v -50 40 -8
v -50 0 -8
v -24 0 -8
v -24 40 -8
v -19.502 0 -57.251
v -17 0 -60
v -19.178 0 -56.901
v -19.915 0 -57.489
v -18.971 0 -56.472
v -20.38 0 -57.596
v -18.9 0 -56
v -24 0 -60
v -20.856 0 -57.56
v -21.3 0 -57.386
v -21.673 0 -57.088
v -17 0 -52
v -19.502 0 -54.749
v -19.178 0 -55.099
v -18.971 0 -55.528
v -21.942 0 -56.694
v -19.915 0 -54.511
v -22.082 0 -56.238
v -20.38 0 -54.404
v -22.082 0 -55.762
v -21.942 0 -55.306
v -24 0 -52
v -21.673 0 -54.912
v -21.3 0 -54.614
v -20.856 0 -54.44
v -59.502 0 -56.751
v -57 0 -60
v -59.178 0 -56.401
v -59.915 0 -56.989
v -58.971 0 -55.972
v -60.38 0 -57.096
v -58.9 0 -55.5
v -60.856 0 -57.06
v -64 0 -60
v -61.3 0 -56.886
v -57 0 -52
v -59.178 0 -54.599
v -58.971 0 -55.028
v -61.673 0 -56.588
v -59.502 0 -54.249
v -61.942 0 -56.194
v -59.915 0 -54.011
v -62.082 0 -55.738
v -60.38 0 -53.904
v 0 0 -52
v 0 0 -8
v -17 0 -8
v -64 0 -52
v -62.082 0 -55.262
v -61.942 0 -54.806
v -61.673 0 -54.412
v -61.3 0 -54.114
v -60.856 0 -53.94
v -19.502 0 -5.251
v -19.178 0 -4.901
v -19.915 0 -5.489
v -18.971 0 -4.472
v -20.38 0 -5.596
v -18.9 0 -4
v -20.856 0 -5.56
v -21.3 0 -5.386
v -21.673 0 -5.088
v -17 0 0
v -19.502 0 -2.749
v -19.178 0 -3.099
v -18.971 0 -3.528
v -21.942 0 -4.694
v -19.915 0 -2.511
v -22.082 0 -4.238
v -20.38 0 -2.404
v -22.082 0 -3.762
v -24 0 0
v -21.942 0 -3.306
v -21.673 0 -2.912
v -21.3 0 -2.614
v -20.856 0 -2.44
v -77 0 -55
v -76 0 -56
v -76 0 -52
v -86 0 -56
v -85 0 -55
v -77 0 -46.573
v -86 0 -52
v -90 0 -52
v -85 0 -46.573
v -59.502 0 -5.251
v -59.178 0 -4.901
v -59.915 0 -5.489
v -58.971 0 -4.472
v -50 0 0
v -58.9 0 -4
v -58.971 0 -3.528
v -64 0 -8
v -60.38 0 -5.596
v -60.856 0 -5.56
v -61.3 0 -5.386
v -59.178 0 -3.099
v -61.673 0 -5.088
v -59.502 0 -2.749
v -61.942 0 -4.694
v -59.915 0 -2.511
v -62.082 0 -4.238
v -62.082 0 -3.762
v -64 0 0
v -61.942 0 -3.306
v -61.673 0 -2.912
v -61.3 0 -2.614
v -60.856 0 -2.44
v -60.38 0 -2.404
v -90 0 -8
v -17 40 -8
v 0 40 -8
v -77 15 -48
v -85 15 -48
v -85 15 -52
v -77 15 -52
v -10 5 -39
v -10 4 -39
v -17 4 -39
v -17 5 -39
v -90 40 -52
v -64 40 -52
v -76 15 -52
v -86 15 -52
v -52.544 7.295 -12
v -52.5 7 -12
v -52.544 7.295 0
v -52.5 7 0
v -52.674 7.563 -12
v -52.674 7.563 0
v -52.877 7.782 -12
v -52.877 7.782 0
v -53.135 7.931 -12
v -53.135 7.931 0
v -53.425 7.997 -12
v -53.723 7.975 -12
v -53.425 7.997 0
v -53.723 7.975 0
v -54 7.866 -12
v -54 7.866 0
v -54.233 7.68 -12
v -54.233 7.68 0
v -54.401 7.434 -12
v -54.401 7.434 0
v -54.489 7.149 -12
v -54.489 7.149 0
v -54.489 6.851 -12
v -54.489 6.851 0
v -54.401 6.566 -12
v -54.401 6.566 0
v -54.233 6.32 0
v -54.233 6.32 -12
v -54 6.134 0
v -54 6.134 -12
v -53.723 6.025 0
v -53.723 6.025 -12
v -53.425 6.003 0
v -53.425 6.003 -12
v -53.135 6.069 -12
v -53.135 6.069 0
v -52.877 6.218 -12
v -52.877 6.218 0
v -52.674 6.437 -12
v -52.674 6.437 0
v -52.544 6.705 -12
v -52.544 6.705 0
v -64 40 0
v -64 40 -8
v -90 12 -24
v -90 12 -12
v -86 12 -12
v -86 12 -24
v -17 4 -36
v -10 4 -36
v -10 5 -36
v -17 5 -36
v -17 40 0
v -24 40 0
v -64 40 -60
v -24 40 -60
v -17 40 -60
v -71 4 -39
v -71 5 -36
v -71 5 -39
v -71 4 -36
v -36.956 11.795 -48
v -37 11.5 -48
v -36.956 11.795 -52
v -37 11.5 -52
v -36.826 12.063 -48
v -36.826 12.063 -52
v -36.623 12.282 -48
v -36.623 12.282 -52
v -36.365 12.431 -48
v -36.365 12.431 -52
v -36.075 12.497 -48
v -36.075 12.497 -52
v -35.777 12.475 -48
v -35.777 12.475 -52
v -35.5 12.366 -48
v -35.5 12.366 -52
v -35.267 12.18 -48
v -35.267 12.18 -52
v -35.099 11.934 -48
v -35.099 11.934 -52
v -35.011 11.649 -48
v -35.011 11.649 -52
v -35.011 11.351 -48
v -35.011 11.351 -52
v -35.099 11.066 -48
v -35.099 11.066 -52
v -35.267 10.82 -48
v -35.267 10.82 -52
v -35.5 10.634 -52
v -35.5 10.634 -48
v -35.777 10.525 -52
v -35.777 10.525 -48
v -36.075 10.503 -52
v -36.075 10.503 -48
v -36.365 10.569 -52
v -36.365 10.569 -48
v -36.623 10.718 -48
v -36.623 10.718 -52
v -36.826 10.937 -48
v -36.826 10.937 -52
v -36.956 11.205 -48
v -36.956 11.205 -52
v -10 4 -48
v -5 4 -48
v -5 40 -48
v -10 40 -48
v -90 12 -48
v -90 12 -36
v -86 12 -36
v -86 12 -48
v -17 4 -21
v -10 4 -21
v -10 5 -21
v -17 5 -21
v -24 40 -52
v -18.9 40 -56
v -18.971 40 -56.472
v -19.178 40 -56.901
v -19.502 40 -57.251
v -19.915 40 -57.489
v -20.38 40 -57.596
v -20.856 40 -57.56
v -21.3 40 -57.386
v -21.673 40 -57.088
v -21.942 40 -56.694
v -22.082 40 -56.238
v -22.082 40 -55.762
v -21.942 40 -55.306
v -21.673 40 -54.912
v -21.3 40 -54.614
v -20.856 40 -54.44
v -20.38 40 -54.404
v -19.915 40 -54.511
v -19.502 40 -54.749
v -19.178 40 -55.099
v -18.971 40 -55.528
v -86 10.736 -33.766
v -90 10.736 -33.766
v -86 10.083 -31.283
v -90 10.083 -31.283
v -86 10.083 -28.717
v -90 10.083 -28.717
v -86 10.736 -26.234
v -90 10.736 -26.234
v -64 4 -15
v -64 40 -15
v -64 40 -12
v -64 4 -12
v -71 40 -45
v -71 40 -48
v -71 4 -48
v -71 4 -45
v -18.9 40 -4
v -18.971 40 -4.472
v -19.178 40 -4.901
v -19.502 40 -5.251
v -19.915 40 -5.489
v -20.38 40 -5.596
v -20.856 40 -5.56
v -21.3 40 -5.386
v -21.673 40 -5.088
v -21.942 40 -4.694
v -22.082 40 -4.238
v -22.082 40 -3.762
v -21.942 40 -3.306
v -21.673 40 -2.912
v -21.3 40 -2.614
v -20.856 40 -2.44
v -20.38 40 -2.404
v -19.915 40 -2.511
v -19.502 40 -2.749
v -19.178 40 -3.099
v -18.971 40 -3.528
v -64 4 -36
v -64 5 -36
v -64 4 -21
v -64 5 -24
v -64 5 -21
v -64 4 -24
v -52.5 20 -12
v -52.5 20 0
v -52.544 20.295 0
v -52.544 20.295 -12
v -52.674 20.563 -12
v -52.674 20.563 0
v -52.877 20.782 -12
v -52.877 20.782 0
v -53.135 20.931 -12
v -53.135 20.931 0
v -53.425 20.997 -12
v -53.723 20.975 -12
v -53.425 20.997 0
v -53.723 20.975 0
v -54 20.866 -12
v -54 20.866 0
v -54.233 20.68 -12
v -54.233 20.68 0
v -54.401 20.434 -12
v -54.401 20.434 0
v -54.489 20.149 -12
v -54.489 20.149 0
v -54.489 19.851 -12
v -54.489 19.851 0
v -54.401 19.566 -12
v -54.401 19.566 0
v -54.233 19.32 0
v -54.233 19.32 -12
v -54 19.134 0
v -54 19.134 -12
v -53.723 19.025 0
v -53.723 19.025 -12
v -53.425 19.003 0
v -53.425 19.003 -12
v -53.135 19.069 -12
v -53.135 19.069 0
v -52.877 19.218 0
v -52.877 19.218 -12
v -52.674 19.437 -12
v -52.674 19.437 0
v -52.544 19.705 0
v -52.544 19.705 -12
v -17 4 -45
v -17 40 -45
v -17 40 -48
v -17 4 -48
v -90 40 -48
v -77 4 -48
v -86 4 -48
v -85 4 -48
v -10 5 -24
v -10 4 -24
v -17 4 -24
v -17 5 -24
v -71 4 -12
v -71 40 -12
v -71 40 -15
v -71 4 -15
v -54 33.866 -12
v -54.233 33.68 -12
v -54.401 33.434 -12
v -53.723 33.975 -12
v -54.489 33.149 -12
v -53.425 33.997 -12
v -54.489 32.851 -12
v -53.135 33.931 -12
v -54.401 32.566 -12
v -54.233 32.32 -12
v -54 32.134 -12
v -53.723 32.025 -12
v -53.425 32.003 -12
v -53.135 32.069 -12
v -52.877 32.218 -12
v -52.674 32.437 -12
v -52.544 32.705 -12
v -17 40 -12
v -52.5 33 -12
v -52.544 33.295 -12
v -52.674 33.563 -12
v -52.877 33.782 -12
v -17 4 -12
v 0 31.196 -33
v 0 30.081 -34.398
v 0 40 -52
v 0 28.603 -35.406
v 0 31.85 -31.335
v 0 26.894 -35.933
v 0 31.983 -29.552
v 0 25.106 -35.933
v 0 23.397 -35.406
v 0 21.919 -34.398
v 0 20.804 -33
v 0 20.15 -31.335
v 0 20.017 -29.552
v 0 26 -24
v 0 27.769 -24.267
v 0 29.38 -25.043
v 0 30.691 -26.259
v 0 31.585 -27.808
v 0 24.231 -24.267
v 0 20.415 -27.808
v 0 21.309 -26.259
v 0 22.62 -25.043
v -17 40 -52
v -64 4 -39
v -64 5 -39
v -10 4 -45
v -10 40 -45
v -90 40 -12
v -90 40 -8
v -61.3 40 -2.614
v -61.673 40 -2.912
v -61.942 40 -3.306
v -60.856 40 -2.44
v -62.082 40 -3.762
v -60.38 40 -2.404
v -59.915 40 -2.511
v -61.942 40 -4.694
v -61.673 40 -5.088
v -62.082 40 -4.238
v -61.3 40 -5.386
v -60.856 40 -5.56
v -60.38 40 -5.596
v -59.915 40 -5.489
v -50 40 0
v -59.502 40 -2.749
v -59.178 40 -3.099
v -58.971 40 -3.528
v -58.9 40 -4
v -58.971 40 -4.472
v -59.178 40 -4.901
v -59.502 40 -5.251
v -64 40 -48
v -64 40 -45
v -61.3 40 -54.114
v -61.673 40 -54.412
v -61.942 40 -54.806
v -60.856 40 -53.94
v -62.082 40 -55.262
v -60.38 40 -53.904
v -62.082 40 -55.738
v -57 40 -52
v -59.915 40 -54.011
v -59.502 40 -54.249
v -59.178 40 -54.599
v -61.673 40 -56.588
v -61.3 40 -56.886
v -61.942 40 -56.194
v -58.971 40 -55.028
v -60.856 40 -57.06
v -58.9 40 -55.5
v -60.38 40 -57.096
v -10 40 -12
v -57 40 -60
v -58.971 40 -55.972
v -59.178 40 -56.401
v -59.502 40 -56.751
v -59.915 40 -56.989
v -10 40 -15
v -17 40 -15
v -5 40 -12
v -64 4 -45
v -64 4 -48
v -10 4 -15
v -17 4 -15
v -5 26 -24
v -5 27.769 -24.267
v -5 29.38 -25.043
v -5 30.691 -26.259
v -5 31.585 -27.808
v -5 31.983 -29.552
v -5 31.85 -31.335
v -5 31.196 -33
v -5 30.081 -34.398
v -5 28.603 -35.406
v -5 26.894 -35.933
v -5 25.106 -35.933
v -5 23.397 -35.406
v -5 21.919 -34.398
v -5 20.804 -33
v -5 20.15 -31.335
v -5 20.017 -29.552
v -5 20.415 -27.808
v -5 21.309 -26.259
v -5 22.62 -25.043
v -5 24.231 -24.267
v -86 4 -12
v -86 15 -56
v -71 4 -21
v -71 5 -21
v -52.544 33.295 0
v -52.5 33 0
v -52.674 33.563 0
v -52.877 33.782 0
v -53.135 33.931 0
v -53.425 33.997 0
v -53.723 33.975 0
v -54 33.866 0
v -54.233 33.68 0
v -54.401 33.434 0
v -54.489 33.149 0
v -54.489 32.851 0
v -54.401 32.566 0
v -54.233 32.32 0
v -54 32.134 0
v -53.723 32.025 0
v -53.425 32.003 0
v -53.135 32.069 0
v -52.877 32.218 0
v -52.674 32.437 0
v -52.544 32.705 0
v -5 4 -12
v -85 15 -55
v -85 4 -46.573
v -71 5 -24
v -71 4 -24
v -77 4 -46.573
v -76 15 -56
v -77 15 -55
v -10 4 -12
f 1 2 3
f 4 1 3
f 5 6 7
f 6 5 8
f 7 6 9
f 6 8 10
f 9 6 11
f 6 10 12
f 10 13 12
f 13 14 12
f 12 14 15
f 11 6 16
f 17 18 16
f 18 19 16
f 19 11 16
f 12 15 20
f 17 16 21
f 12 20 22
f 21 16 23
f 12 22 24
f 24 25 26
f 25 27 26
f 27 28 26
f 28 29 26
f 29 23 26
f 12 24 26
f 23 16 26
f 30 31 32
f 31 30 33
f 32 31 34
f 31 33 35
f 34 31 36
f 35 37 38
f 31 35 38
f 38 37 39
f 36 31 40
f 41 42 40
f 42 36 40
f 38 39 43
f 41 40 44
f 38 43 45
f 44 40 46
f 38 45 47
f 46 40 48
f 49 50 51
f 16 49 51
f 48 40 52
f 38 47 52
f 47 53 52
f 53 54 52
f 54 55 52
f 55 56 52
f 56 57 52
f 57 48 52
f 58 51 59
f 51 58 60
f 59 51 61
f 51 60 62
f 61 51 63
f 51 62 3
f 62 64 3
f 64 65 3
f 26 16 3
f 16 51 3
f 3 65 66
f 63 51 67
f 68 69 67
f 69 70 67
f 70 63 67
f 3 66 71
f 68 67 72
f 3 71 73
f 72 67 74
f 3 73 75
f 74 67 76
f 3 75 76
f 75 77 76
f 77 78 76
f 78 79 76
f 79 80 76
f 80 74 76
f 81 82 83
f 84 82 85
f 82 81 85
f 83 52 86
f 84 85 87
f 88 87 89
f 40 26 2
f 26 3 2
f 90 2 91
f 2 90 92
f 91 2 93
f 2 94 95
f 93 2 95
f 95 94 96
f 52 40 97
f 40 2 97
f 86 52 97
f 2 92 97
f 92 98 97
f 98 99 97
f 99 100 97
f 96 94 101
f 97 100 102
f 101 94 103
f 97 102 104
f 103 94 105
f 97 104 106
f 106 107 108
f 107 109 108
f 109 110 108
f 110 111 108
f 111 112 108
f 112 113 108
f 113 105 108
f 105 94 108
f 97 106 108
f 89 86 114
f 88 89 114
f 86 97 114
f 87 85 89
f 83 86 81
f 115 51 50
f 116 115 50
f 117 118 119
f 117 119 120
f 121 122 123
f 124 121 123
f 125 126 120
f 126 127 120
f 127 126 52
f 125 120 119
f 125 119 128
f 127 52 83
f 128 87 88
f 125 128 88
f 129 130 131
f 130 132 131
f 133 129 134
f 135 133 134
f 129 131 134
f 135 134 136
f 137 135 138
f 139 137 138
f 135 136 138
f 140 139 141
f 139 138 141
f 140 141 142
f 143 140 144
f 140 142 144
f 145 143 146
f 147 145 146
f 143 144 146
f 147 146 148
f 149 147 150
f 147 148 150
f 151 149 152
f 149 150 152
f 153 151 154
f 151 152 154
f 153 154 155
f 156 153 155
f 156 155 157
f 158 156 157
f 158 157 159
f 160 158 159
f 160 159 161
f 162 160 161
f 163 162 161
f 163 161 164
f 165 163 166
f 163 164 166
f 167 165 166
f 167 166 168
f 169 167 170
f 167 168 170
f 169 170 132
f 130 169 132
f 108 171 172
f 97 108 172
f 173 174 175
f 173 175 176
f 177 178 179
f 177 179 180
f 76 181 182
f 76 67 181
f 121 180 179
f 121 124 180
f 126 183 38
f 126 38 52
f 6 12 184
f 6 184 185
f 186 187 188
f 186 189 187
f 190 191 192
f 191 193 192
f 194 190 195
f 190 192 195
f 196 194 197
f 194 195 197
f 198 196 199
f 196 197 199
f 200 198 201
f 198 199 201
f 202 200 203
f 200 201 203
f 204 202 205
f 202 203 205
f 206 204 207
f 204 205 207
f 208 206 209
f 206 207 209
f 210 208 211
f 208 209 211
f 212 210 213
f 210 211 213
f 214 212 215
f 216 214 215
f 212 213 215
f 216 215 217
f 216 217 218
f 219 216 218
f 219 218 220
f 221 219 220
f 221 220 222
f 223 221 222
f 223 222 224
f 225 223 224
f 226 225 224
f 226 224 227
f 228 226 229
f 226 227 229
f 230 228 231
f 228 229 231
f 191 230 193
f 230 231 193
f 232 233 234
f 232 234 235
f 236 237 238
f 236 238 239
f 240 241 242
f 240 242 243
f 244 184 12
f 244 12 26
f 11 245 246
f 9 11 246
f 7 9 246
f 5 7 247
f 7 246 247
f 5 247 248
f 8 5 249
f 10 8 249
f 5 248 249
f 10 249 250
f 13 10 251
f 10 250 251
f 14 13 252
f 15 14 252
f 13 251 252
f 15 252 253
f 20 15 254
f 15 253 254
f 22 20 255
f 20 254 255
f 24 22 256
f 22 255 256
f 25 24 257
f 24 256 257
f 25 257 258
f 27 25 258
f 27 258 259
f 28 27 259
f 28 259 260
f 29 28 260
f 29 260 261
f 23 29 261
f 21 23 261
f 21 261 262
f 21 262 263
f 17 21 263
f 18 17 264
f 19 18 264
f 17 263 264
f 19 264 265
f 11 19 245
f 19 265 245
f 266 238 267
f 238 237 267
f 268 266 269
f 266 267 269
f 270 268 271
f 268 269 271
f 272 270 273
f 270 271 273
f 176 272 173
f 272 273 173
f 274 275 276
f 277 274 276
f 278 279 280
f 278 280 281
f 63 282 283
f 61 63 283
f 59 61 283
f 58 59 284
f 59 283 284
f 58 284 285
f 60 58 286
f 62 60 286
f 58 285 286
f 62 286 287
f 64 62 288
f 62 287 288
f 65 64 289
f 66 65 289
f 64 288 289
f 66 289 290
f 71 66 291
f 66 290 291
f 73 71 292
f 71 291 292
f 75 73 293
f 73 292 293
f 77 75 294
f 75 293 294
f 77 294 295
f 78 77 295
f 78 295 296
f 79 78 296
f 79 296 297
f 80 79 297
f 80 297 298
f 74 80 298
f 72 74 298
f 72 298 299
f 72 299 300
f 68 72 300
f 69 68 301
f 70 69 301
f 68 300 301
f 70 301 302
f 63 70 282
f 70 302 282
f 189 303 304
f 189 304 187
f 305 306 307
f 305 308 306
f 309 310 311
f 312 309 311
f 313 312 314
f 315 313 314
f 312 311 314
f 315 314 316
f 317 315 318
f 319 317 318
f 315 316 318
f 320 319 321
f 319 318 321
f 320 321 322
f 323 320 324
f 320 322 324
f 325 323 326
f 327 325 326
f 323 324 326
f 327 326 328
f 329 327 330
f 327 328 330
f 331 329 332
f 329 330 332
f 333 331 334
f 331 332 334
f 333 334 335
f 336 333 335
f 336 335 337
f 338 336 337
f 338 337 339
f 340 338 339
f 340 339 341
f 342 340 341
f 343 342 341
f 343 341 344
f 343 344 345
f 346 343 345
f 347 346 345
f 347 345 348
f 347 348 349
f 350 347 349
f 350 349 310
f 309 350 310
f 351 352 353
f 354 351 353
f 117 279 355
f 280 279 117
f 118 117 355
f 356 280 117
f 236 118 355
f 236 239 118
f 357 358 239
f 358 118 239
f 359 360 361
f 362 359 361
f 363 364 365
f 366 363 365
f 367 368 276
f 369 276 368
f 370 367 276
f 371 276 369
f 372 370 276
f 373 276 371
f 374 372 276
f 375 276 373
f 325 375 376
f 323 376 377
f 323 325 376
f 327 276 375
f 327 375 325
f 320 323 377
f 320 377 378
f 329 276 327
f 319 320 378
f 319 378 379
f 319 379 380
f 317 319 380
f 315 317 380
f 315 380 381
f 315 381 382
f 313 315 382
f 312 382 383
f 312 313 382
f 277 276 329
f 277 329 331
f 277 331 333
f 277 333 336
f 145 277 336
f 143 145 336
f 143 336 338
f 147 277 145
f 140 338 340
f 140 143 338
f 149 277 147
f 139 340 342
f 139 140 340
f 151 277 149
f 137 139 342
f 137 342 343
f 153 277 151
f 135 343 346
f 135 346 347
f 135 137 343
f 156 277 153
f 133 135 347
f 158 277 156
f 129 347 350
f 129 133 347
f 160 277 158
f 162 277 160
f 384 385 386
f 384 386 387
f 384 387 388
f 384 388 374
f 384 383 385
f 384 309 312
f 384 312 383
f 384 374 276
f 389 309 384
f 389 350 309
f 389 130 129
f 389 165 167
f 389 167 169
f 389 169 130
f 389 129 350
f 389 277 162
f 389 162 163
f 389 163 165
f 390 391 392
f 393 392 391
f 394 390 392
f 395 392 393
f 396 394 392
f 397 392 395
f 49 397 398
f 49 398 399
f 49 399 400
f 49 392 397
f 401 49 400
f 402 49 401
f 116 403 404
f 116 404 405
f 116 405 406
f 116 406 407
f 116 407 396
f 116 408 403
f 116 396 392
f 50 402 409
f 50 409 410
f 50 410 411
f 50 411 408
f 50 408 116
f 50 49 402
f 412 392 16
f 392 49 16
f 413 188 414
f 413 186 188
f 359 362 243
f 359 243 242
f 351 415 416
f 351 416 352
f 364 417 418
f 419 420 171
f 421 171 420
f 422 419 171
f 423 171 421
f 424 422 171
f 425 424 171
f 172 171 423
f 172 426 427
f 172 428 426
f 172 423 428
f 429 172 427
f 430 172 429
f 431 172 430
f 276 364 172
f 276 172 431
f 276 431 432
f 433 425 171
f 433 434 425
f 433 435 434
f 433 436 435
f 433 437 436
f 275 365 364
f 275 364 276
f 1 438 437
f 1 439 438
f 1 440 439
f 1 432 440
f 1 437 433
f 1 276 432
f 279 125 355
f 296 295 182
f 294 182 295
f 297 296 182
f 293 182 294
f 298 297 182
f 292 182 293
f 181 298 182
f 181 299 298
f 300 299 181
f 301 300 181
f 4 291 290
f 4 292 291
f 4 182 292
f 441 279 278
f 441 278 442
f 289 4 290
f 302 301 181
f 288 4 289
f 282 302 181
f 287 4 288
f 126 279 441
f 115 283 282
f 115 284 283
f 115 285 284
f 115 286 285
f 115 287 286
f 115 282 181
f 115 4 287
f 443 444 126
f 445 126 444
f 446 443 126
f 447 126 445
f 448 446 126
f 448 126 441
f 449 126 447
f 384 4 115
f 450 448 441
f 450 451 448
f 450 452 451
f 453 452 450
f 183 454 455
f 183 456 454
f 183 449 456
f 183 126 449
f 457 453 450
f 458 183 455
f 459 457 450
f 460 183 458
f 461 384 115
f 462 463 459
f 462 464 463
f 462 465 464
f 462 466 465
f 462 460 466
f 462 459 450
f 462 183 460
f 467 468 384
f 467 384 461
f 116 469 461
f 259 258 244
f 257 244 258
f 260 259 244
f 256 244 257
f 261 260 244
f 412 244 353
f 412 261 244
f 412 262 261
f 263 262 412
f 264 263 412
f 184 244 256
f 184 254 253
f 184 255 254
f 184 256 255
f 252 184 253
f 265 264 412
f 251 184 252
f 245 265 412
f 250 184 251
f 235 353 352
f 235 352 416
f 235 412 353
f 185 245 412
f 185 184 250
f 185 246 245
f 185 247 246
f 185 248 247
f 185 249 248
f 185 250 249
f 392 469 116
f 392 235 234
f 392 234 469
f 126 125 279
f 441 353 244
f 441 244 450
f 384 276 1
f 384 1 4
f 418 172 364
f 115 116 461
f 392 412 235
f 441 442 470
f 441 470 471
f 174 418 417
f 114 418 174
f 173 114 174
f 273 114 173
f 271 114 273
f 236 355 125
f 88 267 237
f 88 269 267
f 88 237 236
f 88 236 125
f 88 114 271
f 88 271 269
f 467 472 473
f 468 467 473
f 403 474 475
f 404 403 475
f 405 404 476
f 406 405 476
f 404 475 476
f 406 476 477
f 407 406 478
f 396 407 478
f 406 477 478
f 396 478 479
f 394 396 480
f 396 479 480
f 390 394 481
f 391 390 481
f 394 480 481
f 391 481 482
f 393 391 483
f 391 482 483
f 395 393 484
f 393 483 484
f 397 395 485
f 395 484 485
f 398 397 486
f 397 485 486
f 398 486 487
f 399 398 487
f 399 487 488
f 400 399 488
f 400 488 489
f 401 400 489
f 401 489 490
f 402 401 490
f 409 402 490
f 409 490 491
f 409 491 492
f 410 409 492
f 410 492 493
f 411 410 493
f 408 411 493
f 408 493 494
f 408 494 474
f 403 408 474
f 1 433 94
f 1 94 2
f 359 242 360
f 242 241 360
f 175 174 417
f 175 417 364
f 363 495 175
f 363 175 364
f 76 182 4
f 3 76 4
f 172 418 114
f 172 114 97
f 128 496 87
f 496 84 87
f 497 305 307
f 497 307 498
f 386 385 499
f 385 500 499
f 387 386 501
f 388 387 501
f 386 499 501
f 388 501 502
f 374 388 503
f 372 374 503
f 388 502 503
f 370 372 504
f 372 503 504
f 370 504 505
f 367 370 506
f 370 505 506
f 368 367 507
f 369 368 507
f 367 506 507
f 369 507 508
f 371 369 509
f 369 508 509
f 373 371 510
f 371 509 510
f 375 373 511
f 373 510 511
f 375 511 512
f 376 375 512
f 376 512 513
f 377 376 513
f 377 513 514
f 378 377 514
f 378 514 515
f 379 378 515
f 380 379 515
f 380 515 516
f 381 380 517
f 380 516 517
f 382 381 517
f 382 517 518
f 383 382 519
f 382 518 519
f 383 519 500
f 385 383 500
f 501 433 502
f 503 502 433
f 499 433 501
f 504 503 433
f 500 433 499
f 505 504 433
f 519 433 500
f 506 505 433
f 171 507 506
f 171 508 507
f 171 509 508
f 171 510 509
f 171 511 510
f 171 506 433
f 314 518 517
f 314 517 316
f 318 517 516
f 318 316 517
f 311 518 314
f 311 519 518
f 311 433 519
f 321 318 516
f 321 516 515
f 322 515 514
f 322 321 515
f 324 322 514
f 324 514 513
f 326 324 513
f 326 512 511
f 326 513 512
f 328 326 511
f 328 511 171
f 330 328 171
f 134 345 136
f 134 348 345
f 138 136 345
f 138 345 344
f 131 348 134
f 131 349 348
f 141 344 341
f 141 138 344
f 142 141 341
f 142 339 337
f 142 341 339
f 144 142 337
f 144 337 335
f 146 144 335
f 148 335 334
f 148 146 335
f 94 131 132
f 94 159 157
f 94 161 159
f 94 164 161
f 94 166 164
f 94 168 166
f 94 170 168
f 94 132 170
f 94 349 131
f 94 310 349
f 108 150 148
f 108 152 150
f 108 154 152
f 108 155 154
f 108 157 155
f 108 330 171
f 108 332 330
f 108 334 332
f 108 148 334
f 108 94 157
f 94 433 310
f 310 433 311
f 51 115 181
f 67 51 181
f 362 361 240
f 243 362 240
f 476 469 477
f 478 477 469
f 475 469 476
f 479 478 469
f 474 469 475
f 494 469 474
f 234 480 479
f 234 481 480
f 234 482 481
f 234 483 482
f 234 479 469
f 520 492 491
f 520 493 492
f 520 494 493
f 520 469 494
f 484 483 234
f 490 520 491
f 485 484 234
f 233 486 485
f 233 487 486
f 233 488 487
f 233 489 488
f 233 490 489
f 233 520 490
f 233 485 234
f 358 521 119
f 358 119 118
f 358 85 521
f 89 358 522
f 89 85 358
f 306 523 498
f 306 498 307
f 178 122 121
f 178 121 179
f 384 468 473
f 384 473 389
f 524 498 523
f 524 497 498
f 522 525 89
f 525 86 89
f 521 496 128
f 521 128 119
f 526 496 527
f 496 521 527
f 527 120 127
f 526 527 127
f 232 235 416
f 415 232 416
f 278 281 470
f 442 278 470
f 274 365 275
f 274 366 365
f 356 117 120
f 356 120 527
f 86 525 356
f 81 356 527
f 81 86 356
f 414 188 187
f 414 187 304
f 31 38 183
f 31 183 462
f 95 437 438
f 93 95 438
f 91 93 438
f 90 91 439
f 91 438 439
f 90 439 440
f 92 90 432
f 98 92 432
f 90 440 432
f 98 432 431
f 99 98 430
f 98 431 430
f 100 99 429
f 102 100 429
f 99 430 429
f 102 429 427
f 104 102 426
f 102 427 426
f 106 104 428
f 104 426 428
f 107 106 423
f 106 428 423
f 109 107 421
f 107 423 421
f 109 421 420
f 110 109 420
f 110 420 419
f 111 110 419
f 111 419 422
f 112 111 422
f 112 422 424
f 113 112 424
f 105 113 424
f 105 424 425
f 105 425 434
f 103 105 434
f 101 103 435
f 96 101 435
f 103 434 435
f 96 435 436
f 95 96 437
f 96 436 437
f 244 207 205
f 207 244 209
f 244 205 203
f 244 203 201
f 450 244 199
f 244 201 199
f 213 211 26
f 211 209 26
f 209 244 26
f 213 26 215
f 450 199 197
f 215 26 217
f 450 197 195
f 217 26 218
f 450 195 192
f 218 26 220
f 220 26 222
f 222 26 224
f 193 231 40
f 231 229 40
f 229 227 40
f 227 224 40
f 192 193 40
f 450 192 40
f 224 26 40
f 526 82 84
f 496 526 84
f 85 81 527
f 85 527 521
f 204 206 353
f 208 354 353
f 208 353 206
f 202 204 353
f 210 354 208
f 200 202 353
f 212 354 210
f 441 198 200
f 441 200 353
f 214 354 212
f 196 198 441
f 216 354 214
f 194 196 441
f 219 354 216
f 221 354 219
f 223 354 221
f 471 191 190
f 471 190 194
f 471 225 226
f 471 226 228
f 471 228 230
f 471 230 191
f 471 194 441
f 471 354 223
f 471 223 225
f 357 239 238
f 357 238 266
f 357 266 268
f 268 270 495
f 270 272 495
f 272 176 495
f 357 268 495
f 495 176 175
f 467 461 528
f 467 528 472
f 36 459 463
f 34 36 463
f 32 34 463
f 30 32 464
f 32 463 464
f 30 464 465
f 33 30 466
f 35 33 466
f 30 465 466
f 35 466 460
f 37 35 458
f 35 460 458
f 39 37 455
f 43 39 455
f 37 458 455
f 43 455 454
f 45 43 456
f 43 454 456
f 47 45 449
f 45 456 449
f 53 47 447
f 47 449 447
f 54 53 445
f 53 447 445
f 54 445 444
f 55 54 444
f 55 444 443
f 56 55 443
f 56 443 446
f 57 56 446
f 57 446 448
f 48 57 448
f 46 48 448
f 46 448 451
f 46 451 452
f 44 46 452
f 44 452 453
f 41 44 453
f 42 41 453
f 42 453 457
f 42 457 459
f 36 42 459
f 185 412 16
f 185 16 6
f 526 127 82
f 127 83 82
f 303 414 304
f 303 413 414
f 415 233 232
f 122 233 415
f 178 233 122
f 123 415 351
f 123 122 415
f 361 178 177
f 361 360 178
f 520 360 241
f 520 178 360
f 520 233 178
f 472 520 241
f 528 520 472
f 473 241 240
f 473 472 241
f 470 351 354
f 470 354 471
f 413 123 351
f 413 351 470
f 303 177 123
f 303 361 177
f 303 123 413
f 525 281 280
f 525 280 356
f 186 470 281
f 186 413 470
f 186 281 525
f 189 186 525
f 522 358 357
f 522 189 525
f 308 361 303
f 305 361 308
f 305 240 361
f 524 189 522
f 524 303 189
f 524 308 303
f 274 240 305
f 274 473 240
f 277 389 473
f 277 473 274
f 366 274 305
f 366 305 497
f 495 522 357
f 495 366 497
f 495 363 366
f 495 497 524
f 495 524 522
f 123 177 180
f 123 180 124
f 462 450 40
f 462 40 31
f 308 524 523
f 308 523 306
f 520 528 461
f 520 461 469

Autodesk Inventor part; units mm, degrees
ref_plane "YZ Plane" through (0, 0, 0) normal (1, 0, 0) x (0, 1, 0)
ref_plane "XZ Plane" through (0, 0, 0) normal (0, 1, 0) x (-1, 0, 0)
ref_plane "XY Plane" through (0, 0, 0) normal (0, 0, 1) x (1, 0, 0)
sketch "Sketch1" plane through (0, 0, 0) normal (0, 1, 0) x (-1, 0, 0)
  line L0 (0, 0) -> (90, 0)
  line L1 (90, 0) -> (90, -52)
  line L2 (90, -60) -> (0, -60)
  line L3 (0, -60) -> (0, 0)
  line L4 (0, 0) -> (90, 0)
  line L5 (90, 0) -> (90, -8)
  line L6 (90, -8) -> (0, -8)
  line L7 (0, -8) -> (0, 0)
  line L8 (90, -60) -> (0, -60)
  line L9 (0, -60) -> (0, -52)
  line L10 (0, -52) -> (90, -52)
  line L11 (90, -52) -> (90, -60)
  line L12 (0, -8) -> (90, -8)
  line L13 (90, -8) -> (90, -12)
  line L14 (90, -12) -> (0, -12)
  line L15 (0, -12) -> (0, -8)
  line L16 (90, -52) -> (0, -52)
  line L17 (0, -52) -> (0, -48)
  line L18 (0, -48) -> (90, -48)
  line L19 (90, -48) -> (90, -52)
  line L20 (90, 0) -> (64, 0)
  line L21 (64, 0) -> (64, -8)
  line L22 (64, -8) -> (90, -8)
  line L23 (90, -8) -> (90, 0)
  line L24 (64, -8) -> (57, -8)
  line L25 (57, -8) -> (57, 0)
  line L26 (57, 0) -> (64, 0)
  line L27 (64, 0) -> (64, -8)
  line L28 (57, 0) -> (24, 0)
  line L29 (24, 0) -> (24, -8)
  line L30 (24, -8) -> (57, -8)
  line L31 (57, -8) -> (57, 0)
  line L32 (24, -8) -> (17, -8)
  line L33 (17, -8) -> (17, 0)
  line L34 (17, 0) -> (24, 0)
  line L35 (24, 0) -> (24, -8)
  line L36 (57, 0) -> (50, 0)
  line L37 (50, 0) -> (50, -8)
  line L38 (50, -8) -> (57, -8)
  line L39 (57, -8) -> (57, 0)
  line L40 (64, -52) -> (57, -52)
  line L41 (57, -52) -> (57, -60)
  line L42 (57, -60) -> (64, -60)
  line L43 (64, -60) -> (64, -52)
  line L44 (24, -52) -> (17, -52)
  line L45 (17, -52) -> (17, -60)
  line L46 (17, -60) -> (24, -60)
  line L47 (24, -60) -> (24, -52)
  dimension "d0" = 90
  dimension "d1" = 60
  dimension "d49" = 8
  dimension "d50" = 8
extrude "Extrusion1" add sketch "Sketch1" along normal blind 4 contours L14 L1 L18 L3
extrude "Extrusion2" add sketch "Sketch1" along normal blind 40 contours L0 L29 L6 L33 | L6 L1 L14 L3 | L0 L25 L6 L37 | L18 L1 L10 L3 | L0 L21 L6 L25 | L10 L47 L2 L45 | L43 L2 L41 L10
sketch "Sketch2" plane through (0, 40, 0) normal (0, 1, 0) x (1, 0, 0)
  line L0 (-64, 60) -> (-64, 52) projected
  line L1 (-57, 52) -> (-57, 60) projected
  circle A0 centre (-60.5, 55.5) radius 1.6
  line L2 (-24, 60) -> (-24, 52) projected
  circle A1 centre (-20.5, 56) radius 1.6
  line L3 (-90, 8) -> (-64, 8) projected
  circle A2 centre (-60.5, 4) radius 1.6
  line L4 (-17, 0) -> (-17, 8) projected
  line L5 (-24, 0) -> (-17, 0) projected
  circle A3 centre (-20.5, 4) radius 1.6
  point P0 (0, 0)
  point P1 (-17, 52)
  dimension "d6" = 3.2
  dimension "d7" = 3.2
  dimension "d9" = 3.2
  dimension "d10" = 3.2
extrude "Extrusion3" cut sketch "Sketch2" against normal blind 100
sketch "Sketch3" plane through (-64, 0, 0) normal (0, 0, 1) x (1, 0, 0)
  line L0 (0, 0) -> (14, 0) projected
  line L1 (7, 0) -> (7, 40) projected
  line L2 (7, 0) -> (7, 40)
  line L3 (0, 40) -> (14, 40) projected
  circle A0 centre (10.5, 20) radius 1
  circle A1 centre (10.5, 33) radius 1
  circle A2 centre (10.5, 7) radius 1
  point P0 (64, 0)
  dimension "d13" = 2
extrude "Extrusion4" cut sketch "Sketch3" against normal blind 30
sketch "Sketch4" plane through (0, 4, 0) normal (0, 1, 0) x (1, 0, 0)
  line L0 (0, 12) -> (-90, 12) projected
  line L1 (0, 48) -> (-90, 48) projected
  line L2 (-90, 12) -> (-86.8, 12)
  line L3 (-86.8, 12) -> (-86.8, 48)
  line L4 (-86.8, 48) -> (-90, 48)
  line L5 (-90, 48) -> (-90, 12)
  line L6 (0, 12) -> (-5, 12)
  line L7 (-5, 12) -> (-5, 48)
  line L8 (-5, 48) -> (0, 48)
  line L9 (0, 48) -> (0, 12)
  line L10 (-17, 12) -> (-10, 12)
  line L11 (-10, 12) -> (-10, 15)
  line L12 (-10, 15) -> (-17, 15)
  line L13 (-17, 15) -> (-17, 12)
  line L14 (-17, 48) -> (-10, 48)
  line L15 (-10, 48) -> (-10, 45)
  line L16 (-10, 45) -> (-17, 45)
  line L17 (-17, 45) -> (-17, 48)
  line L18 (-17, 15) -> (-10, 15)
  line L19 (-10, 21) -> (-17, 21)
  line L20 (-17, 21) -> (-10, 21)
  line L21 (-10, 21) -> (-10, 24)
  line L22 (-10, 24) -> (-17, 24)
  line L23 (-17, 24) -> (-17, 21)
  line L24 (-17, 45) -> (-10, 45)
  line L25 (-10, 39) -> (-17, 39)
  line L26 (-17, 39) -> (-10, 39)
  line L27 (-10, 39) -> (-10, 36)
  line L28 (-10, 36) -> (-17, 36)
  line L29 (-17, 36) -> (-17, 39)
  line L30 (-64, 12) -> (-71, 12)
  line L31 (-71, 12) -> (-71, 15)
  line L32 (-71, 15) -> (-64, 15)
  line L33 (-64, 15) -> (-64, 12)
  line L34 (-64, 21) -> (-71, 21)
  line L35 (-71, 21) -> (-71, 24)
  line L36 (-71, 24) -> (-64, 24)
  line L37 (-64, 24) -> (-64, 21)
  line L38 (-64, 36) -> (-71, 36)
  line L39 (-71, 36) -> (-71, 39)
  line L40 (-71, 39) -> (-64, 39)
  line L41 (-64, 39) -> (-64, 36)
  line L42 (-64, 48) -> (-71, 48)
  line L43 (-71, 48) -> (-71, 45)
  line L44 (-71, 45) -> (-64, 45)
  line L45 (-64, 45) -> (-64, 48)
  line L46 (-10, 48) -> (-17, 48)
  line L47 (-10, 12) -> (-17, 12)
  point P0 (0, 0)
  dimension "d16" = 3.2
extrude "Extrusion5" add sketch "Sketch4" along normal blind 36 contours L0 L7 L1 L9
extrude "Extrusion6" add sketch "Sketch4" along normal blind 36 contours L0 L13 L12 L11 | L15 L16 L17 L1 | L0 L31 L32 L33 | L45 L44 L43 L1
extrude "Extrusion7" add sketch "Sketch4" along normal blind 1 contours L19 L23 L22 L21 | L27 L28 L29 L25 | L34 L35 L36 L37 | L38 L39 L40 L41
sketch "Sketch5" plane through (-5, 4, -48) normal (-1, 0, 0) x (0, 0, 1)
  line L0 (0, 36) -> (36, 36) projected
  circle A0 centre (18, 22) radius 6
  point P0 (48, -4)
extrude "Extrusion8" cut sketch "Sketch5" against normal blind 20
sketch "Sketch6" plane through (-90, 0, -8) normal (-1, 0, 0) x (0, 0, 1)
  line L0 (0, 0) -> (-44, 0) projected
  line L1 (-40, 4) -> (-40, 40) projected
  arc A0 (-28, 12) -> (-16, 12) centre (-22, 20) ccw
  line L2 (-37, 4) -> (-37, 40) projected
  line L3 (-4, 12) -> (-16, 12)
  line L4 (-28, 12) -> (-37, 12)
  line L5 (-7, 4) -> (-4, 4) projected
  line L6 (-4, 4) -> (-4, 12)
  line L7 (-4, 40) -> (-4, 4) projected
  line L8 (-40, 4) -> (-4, 4)
  line L9 (-37, 12) -> (-40, 12)
  line L10 (-40, 12) -> (-40, 4)
  point P0 (8, 0)
  dimension "d30" = 20
extrude "Extrusion9" add sketch "Sketch6" against normal blind 4
sketch "Sketch8" plane through (0, 0, 0) normal (0, -1, 0) x (1, 0, 0)
  line L0 (-64, -52) -> (-90, -52) projected
  line L1 (-86, -52) -> (-76, -52)
  line L2 (-76, -52) -> (-76, -56)
  line L3 (-76, -56) -> (-86, -56)
  line L4 (-86, -56) -> (-86, -52)
  line L5 (-85, -52) -> (-77, -52)
  line L6 (-77, -52) -> (-77, -55)
  line L7 (-77, -55) -> (-85, -55)
  line L8 (-85, -55) -> (-85, -52)
  line L9 (-85, -55) -> (-77, -55)
  line L10 (-77, -55) -> (-77, -46.5727)
  line L11 (-77, -46.5727) -> (-85, -46.5727)
  line L12 (-85, -46.5727) -> (-85, -55)
  point P0 (0, 0)
extrude "Extrusion14" add sketch "Sketch8" against normal blind 15 contours L2 L3 L4 L0 L8 L7 L6 | L6 L7 L8 L0
extrude "Extrusion15" cut sketch "Sketch8" against normal blind 15 contours L6 L7 L8 L0 | L0 L12 L11 L10
sketch "Sketch9" plane through (0, 0, -52) normal (0, 0, -1) x (-1, 0, 0)
  line L0 (0, 0) -> (0, 40) projected
  line L1 (0, 0) -> (36, 0)
  line L2 (36, 0) -> (36, 11.5)
  line L3 (36, 11.5) -> (0, 11.5)
  line L4 (0, 11.5) -> (0, 0)
  circle A0 centre (36, 11.5) radius 1
  dimension "d45" = 11.5
  dimension "d46" = 2
extrude "Extrusion16" cut sketch "Sketch9" against normal blind 10 contours A0 L2 L3 | L3 L2 A0
sketch "Sketch10" plane through (-90, 0, -8) normal (-1, 0, 0) x (0, 0, 1)
  line L0 (-44, 0) -> (-52, 0) projected
  line L1 (-44, 0) -> (-44, 7)
  line L2 (-44, 0) -> (-44, 40) projected
  circle A0 centre (-33, 7) radius 1.2
  line L3 (0, 0) -> (0, 40) projected
  line L4 (0, 7) -> (11, 7) construction
  circle A1 centre (-11, 7) radius 1.2
  point P0 (8, 0)
  dimension "d51" = 2.4
  dimension "d54" = 2.4
properties part number "_3DPrint"
